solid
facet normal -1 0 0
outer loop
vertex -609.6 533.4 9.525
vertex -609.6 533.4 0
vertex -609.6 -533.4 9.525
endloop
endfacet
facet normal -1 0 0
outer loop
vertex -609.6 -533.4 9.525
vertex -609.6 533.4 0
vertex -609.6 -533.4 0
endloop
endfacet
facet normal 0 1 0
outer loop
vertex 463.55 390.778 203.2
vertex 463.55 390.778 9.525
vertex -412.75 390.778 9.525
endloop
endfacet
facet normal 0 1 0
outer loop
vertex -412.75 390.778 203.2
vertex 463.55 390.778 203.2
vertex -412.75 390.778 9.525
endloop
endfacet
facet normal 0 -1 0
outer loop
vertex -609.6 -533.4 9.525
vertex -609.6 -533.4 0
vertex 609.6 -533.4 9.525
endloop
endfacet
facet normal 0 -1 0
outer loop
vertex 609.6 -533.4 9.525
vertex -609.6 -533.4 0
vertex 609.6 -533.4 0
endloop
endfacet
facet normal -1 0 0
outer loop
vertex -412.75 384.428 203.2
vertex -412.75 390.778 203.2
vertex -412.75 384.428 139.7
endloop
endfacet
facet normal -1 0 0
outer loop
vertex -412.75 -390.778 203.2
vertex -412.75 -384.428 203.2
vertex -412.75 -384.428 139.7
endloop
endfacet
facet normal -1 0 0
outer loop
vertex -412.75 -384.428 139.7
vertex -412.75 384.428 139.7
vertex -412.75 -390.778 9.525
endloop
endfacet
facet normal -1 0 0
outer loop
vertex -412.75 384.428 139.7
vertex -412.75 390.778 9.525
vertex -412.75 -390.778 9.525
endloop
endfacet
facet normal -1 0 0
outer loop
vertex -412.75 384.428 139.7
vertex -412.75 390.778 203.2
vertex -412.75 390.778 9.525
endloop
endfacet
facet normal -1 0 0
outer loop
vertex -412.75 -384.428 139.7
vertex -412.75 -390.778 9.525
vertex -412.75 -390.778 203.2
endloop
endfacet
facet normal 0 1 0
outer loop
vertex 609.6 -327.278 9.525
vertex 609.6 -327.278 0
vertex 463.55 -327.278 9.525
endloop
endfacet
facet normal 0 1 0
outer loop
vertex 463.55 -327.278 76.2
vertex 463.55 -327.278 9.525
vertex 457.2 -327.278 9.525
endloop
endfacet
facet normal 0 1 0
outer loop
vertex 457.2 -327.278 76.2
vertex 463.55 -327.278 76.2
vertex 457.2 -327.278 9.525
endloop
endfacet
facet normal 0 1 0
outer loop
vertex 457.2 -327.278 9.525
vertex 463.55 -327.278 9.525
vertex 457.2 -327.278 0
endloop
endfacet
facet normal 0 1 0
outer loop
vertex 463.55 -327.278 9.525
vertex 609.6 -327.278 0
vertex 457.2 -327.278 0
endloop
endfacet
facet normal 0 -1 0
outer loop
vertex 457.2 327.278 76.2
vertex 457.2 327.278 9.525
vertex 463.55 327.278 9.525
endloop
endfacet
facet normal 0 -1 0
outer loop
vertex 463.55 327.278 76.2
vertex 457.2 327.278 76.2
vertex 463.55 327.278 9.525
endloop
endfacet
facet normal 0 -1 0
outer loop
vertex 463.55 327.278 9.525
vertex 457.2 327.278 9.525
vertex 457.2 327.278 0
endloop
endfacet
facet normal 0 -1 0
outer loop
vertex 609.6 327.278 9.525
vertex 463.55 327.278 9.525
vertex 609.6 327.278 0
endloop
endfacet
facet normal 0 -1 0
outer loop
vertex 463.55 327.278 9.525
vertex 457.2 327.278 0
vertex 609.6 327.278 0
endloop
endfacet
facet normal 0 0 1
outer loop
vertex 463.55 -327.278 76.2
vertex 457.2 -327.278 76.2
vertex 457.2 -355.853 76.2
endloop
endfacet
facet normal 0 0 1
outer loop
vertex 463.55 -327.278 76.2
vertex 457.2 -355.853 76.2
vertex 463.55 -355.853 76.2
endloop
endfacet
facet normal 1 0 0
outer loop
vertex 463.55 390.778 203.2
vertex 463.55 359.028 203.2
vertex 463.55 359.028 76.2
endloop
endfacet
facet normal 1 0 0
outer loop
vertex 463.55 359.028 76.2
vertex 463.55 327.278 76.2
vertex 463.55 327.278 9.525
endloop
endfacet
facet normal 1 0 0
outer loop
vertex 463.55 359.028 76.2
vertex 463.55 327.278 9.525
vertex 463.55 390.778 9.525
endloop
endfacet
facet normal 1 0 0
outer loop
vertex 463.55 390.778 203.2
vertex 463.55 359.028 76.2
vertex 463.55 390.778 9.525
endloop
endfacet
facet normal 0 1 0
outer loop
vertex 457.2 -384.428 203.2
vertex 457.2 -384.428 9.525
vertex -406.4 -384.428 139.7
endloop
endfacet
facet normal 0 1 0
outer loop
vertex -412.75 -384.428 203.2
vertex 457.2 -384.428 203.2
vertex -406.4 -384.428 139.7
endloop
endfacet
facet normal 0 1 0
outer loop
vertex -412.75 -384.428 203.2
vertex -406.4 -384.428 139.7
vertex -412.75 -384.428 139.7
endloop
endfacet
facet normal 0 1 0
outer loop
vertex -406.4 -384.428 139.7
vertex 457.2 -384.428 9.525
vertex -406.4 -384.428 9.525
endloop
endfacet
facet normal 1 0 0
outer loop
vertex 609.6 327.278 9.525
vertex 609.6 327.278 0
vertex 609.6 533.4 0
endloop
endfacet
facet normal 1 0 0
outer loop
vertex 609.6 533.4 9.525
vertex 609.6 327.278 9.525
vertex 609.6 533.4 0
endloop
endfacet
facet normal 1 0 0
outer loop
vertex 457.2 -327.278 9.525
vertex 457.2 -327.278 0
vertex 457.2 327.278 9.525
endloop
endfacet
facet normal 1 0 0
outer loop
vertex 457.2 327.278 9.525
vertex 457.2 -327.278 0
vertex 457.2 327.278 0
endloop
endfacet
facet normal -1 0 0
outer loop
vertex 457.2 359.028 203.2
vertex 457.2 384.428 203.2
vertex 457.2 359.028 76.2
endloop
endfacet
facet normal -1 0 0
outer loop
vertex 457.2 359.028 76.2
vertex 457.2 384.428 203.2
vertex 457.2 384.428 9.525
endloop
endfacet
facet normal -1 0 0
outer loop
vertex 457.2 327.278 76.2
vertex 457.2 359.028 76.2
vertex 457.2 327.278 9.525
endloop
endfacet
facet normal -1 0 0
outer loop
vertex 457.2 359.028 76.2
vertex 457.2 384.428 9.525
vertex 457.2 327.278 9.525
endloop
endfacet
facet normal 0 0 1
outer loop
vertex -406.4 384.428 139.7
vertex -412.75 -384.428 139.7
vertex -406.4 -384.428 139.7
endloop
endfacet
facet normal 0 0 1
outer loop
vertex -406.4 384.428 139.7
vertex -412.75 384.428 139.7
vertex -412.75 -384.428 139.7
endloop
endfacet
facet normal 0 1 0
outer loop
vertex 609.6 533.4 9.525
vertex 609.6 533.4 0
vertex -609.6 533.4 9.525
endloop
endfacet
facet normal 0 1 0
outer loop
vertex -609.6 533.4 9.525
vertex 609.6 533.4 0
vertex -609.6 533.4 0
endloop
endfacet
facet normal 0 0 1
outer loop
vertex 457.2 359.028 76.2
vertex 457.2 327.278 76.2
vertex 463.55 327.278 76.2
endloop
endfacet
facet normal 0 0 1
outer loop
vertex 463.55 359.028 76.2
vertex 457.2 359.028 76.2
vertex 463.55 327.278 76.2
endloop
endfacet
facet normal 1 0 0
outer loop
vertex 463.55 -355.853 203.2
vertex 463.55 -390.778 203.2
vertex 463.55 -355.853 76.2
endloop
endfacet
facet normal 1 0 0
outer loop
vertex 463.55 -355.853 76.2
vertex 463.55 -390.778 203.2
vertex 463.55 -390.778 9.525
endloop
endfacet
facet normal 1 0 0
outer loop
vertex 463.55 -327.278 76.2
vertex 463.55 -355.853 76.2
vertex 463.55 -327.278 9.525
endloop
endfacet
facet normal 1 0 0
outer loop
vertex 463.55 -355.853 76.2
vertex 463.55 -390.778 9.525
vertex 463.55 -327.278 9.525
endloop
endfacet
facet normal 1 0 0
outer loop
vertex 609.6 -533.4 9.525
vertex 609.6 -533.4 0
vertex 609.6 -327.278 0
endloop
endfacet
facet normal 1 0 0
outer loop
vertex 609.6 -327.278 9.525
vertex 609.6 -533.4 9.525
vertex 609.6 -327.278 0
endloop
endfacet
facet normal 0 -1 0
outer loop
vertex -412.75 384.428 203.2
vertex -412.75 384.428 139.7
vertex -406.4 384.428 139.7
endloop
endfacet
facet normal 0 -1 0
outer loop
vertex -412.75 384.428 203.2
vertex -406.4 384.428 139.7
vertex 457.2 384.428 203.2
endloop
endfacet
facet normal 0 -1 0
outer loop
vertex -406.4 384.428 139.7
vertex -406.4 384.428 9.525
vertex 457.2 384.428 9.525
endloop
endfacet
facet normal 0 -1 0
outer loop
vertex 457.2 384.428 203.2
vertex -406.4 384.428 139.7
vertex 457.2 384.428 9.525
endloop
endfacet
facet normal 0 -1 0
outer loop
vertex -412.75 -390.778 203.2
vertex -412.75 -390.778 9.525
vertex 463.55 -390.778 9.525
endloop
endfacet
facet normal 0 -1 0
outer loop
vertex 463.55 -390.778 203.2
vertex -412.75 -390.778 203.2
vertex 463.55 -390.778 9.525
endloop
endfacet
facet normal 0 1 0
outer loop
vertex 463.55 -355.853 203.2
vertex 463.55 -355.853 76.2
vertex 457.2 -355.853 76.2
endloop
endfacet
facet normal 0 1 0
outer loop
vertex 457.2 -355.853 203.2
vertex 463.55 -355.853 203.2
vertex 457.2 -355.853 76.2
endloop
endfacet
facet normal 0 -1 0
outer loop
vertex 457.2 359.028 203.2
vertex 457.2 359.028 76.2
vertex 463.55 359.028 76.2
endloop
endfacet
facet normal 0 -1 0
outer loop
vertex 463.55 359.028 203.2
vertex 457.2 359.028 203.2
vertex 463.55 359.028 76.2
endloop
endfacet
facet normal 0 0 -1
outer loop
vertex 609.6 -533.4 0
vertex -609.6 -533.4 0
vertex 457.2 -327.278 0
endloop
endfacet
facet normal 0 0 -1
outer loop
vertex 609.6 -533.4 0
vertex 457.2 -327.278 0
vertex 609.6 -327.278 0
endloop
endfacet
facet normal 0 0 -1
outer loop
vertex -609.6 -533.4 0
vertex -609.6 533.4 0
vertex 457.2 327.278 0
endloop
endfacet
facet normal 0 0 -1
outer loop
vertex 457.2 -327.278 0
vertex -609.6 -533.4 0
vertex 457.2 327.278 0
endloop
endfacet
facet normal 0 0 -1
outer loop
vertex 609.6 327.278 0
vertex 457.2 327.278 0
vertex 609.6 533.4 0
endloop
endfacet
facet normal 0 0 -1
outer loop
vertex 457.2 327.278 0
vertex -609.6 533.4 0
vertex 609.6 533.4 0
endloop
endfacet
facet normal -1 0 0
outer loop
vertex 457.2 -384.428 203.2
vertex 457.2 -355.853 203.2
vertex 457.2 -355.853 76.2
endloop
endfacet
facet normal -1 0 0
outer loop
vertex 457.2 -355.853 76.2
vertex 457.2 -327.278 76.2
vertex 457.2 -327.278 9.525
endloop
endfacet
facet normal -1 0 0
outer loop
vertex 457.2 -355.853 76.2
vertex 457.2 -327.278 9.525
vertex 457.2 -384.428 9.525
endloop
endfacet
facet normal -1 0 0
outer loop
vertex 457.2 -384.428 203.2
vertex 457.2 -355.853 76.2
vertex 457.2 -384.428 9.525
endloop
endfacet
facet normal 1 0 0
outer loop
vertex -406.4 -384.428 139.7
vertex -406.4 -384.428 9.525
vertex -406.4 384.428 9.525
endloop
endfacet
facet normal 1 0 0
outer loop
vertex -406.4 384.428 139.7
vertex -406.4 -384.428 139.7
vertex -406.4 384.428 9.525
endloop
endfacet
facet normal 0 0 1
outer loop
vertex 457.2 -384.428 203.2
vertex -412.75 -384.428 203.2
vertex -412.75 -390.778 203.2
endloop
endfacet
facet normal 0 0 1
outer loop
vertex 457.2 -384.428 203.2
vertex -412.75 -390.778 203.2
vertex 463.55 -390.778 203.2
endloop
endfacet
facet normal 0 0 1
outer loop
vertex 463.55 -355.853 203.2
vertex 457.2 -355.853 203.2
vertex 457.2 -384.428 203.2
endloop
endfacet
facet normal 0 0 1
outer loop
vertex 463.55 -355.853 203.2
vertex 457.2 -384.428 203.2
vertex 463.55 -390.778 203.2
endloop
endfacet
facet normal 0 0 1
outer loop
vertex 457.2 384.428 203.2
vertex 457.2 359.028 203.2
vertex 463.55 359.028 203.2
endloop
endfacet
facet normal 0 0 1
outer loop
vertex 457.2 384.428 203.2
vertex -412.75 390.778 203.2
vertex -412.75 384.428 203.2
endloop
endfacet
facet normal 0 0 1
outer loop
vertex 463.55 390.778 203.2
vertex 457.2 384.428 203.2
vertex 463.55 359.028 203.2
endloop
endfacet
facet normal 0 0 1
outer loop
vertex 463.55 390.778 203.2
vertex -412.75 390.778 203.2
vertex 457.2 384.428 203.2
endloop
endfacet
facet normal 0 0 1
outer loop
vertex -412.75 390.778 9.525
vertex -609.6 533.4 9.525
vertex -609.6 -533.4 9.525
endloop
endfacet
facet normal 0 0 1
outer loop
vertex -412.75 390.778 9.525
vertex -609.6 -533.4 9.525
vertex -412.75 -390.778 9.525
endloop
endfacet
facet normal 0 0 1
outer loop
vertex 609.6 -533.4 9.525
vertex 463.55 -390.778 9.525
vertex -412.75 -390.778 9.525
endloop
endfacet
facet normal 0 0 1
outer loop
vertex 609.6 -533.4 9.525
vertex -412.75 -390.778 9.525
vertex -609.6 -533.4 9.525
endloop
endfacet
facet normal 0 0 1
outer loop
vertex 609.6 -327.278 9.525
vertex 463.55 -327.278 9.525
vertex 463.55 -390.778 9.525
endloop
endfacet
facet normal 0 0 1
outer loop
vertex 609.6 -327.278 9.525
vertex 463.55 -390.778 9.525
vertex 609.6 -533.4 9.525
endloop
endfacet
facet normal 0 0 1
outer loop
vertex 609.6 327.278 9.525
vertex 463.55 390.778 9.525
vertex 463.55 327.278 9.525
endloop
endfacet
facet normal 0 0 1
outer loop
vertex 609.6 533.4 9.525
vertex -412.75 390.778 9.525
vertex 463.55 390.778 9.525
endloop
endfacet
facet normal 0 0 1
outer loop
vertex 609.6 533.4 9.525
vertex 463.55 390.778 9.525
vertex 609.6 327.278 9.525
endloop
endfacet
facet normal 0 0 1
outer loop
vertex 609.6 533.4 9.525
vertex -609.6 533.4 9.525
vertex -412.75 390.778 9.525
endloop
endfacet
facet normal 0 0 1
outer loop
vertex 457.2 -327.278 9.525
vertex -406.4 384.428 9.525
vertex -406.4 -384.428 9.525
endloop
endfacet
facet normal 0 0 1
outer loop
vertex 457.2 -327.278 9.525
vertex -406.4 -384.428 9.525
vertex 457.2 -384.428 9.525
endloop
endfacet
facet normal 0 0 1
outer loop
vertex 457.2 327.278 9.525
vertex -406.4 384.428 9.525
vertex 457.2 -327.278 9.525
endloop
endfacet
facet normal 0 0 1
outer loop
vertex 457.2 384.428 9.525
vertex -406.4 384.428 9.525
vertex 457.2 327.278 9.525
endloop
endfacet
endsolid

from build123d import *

# Parameters (mm, degrees)
F0_W     = 6.35
F0_H     = 28.575
F0_H_2   = 31.75
F1_DEPTH = 9.525
F2_DEPTH = 76.2
F3_DEPTH = 203.2
F4_DEPTH = 139.7
F5_DEPTH = 203.2


with BuildPart() as f1:
    # F0 (on Top) → F1 (new body)
    with BuildSketch(Plane.XY):
        Polygon((-609.6, -533.4), (609.6, -533.4), (609.6, -327.277558), (463.55, -327.277558), (463.55, -355.852558), (463.55, -390.777558), (457.2, -390.777558), (-412.75, -390.777558), (-412.75, -384.427558), (-412.75, 0), (-412.75, 384.427558), (-412.75, 390.777558), (457.2, 390.777558), (463.55, 390.777558), (463.55, 359.027558), (463.55, 327.277558), (609.6, 327.277558), (609.6, 533.4), (-609.6, 533.4), (-609.6, 0), align=None)
        with Locations((460.375, -341.565058)):
            Rectangle(F0_W, F0_H)
        Polygon((457.2, -355.852558), (457.2, -327.277558), (457.2, 0), (457.2, 327.277558), (457.2, 359.027558), (457.2, 384.427558), (-406.4, 384.427558), (-406.4, 0), (-406.4, -384.427558), (457.2, -384.427558), align=None)
        with Locations((460.375, 343.152558)):
            Rectangle(F0_W, F0_H_2)
    extrude(amount=F1_DEPTH)

    # F0 (on Top) → F2 (join)
    with BuildSketch(Plane.XY):
        with Locations((460.375, 343.152558)):
            Rectangle(F0_W, F0_H_2)
        with Locations((460.375, -341.565058)):
            Rectangle(F0_W, F0_H)
    extrude(amount=F2_DEPTH)

    # F0 (on Top) → F3 (join)
    with BuildSketch(Plane.XY):
        Polygon((463.55, -390.777558), (463.55, -355.852558), (457.2, -355.852558), (457.2, -384.427558), (-406.4, -384.427558), (-412.75, -384.427558), (-412.75, -390.777558), (457.2, -390.777558), align=None)
    extrude(amount=F3_DEPTH)

    # F0 (on Top) → F4 (join)
    with BuildSketch(Plane.XY):
        Polygon((-412.75, -384.427558), (-406.4, -384.427558), (-406.4, 0), (-406.4, 384.427558), (-412.75, 384.427558), (-412.75, 0), align=None)
    extrude(amount=F4_DEPTH)

    # F0 (on Top) → F5 (join)
    with BuildSketch(Plane.XY):
        Polygon((457.2, 384.427558), (457.2, 359.027558), (463.55, 359.027558), (463.55, 390.777558), (457.2, 390.777558), (-412.75, 390.777558), (-412.75, 384.427558), (-406.4, 384.427558), align=None)
    extrude(amount=F5_DEPTH)


solid = f1.part
